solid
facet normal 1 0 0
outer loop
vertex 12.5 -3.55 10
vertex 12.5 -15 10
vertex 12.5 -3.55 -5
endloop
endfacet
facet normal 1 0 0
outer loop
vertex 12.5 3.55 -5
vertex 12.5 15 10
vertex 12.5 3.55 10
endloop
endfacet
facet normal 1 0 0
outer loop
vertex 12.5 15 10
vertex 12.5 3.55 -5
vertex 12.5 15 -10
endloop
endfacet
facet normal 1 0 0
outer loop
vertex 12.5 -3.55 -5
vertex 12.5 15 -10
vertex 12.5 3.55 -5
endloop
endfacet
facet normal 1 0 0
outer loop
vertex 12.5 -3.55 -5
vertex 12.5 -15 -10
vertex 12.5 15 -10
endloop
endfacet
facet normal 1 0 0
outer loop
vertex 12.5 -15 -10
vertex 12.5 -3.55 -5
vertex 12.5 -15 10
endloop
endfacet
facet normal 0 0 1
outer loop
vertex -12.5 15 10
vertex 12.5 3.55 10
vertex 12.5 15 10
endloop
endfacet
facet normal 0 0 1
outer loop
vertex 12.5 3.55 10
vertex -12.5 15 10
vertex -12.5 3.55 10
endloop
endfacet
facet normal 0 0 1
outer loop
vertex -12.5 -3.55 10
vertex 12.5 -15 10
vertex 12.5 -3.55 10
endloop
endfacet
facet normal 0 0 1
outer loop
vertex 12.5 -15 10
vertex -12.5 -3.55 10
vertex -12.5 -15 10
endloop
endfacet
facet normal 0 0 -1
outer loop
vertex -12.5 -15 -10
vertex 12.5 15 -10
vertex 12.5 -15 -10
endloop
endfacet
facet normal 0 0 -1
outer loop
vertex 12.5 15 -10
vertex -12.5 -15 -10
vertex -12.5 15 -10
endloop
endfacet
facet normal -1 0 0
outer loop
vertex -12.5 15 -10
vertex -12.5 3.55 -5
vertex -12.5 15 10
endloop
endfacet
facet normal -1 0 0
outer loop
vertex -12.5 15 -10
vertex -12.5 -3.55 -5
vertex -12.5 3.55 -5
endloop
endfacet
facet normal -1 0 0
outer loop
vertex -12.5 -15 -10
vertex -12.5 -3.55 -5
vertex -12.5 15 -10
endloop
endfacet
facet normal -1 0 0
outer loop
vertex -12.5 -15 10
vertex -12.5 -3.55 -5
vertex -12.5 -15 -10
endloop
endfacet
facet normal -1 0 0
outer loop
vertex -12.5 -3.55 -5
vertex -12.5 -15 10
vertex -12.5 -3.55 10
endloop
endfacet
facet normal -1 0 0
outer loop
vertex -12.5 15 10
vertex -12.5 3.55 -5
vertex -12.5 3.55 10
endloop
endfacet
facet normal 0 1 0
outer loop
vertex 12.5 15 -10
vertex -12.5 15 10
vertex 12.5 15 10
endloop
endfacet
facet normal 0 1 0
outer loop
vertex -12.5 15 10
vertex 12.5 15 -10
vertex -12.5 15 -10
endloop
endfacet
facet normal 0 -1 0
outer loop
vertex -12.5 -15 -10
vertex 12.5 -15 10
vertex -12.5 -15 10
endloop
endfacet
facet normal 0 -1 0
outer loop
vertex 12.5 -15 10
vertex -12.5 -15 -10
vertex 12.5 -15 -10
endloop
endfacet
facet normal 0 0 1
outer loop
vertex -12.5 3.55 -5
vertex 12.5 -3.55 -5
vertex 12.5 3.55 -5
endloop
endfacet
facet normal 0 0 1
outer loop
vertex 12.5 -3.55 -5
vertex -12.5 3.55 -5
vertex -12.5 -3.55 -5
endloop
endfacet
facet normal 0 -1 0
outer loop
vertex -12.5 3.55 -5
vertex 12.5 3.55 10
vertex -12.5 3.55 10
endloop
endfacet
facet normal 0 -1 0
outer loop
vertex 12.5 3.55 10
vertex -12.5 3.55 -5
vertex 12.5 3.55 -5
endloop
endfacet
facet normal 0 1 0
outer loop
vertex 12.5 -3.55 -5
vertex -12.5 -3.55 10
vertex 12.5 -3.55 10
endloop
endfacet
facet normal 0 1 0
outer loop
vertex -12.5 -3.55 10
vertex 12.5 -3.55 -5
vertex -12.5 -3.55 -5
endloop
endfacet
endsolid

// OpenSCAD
//Prusa i3 Frame Stabilzer

//cube([25, 30, 20], center = true);

difference(){
	cube([25, 30, 20], center = true);
	
	translate([0,0,10])
		cube([500, 7.1, 30], center = true);
}
